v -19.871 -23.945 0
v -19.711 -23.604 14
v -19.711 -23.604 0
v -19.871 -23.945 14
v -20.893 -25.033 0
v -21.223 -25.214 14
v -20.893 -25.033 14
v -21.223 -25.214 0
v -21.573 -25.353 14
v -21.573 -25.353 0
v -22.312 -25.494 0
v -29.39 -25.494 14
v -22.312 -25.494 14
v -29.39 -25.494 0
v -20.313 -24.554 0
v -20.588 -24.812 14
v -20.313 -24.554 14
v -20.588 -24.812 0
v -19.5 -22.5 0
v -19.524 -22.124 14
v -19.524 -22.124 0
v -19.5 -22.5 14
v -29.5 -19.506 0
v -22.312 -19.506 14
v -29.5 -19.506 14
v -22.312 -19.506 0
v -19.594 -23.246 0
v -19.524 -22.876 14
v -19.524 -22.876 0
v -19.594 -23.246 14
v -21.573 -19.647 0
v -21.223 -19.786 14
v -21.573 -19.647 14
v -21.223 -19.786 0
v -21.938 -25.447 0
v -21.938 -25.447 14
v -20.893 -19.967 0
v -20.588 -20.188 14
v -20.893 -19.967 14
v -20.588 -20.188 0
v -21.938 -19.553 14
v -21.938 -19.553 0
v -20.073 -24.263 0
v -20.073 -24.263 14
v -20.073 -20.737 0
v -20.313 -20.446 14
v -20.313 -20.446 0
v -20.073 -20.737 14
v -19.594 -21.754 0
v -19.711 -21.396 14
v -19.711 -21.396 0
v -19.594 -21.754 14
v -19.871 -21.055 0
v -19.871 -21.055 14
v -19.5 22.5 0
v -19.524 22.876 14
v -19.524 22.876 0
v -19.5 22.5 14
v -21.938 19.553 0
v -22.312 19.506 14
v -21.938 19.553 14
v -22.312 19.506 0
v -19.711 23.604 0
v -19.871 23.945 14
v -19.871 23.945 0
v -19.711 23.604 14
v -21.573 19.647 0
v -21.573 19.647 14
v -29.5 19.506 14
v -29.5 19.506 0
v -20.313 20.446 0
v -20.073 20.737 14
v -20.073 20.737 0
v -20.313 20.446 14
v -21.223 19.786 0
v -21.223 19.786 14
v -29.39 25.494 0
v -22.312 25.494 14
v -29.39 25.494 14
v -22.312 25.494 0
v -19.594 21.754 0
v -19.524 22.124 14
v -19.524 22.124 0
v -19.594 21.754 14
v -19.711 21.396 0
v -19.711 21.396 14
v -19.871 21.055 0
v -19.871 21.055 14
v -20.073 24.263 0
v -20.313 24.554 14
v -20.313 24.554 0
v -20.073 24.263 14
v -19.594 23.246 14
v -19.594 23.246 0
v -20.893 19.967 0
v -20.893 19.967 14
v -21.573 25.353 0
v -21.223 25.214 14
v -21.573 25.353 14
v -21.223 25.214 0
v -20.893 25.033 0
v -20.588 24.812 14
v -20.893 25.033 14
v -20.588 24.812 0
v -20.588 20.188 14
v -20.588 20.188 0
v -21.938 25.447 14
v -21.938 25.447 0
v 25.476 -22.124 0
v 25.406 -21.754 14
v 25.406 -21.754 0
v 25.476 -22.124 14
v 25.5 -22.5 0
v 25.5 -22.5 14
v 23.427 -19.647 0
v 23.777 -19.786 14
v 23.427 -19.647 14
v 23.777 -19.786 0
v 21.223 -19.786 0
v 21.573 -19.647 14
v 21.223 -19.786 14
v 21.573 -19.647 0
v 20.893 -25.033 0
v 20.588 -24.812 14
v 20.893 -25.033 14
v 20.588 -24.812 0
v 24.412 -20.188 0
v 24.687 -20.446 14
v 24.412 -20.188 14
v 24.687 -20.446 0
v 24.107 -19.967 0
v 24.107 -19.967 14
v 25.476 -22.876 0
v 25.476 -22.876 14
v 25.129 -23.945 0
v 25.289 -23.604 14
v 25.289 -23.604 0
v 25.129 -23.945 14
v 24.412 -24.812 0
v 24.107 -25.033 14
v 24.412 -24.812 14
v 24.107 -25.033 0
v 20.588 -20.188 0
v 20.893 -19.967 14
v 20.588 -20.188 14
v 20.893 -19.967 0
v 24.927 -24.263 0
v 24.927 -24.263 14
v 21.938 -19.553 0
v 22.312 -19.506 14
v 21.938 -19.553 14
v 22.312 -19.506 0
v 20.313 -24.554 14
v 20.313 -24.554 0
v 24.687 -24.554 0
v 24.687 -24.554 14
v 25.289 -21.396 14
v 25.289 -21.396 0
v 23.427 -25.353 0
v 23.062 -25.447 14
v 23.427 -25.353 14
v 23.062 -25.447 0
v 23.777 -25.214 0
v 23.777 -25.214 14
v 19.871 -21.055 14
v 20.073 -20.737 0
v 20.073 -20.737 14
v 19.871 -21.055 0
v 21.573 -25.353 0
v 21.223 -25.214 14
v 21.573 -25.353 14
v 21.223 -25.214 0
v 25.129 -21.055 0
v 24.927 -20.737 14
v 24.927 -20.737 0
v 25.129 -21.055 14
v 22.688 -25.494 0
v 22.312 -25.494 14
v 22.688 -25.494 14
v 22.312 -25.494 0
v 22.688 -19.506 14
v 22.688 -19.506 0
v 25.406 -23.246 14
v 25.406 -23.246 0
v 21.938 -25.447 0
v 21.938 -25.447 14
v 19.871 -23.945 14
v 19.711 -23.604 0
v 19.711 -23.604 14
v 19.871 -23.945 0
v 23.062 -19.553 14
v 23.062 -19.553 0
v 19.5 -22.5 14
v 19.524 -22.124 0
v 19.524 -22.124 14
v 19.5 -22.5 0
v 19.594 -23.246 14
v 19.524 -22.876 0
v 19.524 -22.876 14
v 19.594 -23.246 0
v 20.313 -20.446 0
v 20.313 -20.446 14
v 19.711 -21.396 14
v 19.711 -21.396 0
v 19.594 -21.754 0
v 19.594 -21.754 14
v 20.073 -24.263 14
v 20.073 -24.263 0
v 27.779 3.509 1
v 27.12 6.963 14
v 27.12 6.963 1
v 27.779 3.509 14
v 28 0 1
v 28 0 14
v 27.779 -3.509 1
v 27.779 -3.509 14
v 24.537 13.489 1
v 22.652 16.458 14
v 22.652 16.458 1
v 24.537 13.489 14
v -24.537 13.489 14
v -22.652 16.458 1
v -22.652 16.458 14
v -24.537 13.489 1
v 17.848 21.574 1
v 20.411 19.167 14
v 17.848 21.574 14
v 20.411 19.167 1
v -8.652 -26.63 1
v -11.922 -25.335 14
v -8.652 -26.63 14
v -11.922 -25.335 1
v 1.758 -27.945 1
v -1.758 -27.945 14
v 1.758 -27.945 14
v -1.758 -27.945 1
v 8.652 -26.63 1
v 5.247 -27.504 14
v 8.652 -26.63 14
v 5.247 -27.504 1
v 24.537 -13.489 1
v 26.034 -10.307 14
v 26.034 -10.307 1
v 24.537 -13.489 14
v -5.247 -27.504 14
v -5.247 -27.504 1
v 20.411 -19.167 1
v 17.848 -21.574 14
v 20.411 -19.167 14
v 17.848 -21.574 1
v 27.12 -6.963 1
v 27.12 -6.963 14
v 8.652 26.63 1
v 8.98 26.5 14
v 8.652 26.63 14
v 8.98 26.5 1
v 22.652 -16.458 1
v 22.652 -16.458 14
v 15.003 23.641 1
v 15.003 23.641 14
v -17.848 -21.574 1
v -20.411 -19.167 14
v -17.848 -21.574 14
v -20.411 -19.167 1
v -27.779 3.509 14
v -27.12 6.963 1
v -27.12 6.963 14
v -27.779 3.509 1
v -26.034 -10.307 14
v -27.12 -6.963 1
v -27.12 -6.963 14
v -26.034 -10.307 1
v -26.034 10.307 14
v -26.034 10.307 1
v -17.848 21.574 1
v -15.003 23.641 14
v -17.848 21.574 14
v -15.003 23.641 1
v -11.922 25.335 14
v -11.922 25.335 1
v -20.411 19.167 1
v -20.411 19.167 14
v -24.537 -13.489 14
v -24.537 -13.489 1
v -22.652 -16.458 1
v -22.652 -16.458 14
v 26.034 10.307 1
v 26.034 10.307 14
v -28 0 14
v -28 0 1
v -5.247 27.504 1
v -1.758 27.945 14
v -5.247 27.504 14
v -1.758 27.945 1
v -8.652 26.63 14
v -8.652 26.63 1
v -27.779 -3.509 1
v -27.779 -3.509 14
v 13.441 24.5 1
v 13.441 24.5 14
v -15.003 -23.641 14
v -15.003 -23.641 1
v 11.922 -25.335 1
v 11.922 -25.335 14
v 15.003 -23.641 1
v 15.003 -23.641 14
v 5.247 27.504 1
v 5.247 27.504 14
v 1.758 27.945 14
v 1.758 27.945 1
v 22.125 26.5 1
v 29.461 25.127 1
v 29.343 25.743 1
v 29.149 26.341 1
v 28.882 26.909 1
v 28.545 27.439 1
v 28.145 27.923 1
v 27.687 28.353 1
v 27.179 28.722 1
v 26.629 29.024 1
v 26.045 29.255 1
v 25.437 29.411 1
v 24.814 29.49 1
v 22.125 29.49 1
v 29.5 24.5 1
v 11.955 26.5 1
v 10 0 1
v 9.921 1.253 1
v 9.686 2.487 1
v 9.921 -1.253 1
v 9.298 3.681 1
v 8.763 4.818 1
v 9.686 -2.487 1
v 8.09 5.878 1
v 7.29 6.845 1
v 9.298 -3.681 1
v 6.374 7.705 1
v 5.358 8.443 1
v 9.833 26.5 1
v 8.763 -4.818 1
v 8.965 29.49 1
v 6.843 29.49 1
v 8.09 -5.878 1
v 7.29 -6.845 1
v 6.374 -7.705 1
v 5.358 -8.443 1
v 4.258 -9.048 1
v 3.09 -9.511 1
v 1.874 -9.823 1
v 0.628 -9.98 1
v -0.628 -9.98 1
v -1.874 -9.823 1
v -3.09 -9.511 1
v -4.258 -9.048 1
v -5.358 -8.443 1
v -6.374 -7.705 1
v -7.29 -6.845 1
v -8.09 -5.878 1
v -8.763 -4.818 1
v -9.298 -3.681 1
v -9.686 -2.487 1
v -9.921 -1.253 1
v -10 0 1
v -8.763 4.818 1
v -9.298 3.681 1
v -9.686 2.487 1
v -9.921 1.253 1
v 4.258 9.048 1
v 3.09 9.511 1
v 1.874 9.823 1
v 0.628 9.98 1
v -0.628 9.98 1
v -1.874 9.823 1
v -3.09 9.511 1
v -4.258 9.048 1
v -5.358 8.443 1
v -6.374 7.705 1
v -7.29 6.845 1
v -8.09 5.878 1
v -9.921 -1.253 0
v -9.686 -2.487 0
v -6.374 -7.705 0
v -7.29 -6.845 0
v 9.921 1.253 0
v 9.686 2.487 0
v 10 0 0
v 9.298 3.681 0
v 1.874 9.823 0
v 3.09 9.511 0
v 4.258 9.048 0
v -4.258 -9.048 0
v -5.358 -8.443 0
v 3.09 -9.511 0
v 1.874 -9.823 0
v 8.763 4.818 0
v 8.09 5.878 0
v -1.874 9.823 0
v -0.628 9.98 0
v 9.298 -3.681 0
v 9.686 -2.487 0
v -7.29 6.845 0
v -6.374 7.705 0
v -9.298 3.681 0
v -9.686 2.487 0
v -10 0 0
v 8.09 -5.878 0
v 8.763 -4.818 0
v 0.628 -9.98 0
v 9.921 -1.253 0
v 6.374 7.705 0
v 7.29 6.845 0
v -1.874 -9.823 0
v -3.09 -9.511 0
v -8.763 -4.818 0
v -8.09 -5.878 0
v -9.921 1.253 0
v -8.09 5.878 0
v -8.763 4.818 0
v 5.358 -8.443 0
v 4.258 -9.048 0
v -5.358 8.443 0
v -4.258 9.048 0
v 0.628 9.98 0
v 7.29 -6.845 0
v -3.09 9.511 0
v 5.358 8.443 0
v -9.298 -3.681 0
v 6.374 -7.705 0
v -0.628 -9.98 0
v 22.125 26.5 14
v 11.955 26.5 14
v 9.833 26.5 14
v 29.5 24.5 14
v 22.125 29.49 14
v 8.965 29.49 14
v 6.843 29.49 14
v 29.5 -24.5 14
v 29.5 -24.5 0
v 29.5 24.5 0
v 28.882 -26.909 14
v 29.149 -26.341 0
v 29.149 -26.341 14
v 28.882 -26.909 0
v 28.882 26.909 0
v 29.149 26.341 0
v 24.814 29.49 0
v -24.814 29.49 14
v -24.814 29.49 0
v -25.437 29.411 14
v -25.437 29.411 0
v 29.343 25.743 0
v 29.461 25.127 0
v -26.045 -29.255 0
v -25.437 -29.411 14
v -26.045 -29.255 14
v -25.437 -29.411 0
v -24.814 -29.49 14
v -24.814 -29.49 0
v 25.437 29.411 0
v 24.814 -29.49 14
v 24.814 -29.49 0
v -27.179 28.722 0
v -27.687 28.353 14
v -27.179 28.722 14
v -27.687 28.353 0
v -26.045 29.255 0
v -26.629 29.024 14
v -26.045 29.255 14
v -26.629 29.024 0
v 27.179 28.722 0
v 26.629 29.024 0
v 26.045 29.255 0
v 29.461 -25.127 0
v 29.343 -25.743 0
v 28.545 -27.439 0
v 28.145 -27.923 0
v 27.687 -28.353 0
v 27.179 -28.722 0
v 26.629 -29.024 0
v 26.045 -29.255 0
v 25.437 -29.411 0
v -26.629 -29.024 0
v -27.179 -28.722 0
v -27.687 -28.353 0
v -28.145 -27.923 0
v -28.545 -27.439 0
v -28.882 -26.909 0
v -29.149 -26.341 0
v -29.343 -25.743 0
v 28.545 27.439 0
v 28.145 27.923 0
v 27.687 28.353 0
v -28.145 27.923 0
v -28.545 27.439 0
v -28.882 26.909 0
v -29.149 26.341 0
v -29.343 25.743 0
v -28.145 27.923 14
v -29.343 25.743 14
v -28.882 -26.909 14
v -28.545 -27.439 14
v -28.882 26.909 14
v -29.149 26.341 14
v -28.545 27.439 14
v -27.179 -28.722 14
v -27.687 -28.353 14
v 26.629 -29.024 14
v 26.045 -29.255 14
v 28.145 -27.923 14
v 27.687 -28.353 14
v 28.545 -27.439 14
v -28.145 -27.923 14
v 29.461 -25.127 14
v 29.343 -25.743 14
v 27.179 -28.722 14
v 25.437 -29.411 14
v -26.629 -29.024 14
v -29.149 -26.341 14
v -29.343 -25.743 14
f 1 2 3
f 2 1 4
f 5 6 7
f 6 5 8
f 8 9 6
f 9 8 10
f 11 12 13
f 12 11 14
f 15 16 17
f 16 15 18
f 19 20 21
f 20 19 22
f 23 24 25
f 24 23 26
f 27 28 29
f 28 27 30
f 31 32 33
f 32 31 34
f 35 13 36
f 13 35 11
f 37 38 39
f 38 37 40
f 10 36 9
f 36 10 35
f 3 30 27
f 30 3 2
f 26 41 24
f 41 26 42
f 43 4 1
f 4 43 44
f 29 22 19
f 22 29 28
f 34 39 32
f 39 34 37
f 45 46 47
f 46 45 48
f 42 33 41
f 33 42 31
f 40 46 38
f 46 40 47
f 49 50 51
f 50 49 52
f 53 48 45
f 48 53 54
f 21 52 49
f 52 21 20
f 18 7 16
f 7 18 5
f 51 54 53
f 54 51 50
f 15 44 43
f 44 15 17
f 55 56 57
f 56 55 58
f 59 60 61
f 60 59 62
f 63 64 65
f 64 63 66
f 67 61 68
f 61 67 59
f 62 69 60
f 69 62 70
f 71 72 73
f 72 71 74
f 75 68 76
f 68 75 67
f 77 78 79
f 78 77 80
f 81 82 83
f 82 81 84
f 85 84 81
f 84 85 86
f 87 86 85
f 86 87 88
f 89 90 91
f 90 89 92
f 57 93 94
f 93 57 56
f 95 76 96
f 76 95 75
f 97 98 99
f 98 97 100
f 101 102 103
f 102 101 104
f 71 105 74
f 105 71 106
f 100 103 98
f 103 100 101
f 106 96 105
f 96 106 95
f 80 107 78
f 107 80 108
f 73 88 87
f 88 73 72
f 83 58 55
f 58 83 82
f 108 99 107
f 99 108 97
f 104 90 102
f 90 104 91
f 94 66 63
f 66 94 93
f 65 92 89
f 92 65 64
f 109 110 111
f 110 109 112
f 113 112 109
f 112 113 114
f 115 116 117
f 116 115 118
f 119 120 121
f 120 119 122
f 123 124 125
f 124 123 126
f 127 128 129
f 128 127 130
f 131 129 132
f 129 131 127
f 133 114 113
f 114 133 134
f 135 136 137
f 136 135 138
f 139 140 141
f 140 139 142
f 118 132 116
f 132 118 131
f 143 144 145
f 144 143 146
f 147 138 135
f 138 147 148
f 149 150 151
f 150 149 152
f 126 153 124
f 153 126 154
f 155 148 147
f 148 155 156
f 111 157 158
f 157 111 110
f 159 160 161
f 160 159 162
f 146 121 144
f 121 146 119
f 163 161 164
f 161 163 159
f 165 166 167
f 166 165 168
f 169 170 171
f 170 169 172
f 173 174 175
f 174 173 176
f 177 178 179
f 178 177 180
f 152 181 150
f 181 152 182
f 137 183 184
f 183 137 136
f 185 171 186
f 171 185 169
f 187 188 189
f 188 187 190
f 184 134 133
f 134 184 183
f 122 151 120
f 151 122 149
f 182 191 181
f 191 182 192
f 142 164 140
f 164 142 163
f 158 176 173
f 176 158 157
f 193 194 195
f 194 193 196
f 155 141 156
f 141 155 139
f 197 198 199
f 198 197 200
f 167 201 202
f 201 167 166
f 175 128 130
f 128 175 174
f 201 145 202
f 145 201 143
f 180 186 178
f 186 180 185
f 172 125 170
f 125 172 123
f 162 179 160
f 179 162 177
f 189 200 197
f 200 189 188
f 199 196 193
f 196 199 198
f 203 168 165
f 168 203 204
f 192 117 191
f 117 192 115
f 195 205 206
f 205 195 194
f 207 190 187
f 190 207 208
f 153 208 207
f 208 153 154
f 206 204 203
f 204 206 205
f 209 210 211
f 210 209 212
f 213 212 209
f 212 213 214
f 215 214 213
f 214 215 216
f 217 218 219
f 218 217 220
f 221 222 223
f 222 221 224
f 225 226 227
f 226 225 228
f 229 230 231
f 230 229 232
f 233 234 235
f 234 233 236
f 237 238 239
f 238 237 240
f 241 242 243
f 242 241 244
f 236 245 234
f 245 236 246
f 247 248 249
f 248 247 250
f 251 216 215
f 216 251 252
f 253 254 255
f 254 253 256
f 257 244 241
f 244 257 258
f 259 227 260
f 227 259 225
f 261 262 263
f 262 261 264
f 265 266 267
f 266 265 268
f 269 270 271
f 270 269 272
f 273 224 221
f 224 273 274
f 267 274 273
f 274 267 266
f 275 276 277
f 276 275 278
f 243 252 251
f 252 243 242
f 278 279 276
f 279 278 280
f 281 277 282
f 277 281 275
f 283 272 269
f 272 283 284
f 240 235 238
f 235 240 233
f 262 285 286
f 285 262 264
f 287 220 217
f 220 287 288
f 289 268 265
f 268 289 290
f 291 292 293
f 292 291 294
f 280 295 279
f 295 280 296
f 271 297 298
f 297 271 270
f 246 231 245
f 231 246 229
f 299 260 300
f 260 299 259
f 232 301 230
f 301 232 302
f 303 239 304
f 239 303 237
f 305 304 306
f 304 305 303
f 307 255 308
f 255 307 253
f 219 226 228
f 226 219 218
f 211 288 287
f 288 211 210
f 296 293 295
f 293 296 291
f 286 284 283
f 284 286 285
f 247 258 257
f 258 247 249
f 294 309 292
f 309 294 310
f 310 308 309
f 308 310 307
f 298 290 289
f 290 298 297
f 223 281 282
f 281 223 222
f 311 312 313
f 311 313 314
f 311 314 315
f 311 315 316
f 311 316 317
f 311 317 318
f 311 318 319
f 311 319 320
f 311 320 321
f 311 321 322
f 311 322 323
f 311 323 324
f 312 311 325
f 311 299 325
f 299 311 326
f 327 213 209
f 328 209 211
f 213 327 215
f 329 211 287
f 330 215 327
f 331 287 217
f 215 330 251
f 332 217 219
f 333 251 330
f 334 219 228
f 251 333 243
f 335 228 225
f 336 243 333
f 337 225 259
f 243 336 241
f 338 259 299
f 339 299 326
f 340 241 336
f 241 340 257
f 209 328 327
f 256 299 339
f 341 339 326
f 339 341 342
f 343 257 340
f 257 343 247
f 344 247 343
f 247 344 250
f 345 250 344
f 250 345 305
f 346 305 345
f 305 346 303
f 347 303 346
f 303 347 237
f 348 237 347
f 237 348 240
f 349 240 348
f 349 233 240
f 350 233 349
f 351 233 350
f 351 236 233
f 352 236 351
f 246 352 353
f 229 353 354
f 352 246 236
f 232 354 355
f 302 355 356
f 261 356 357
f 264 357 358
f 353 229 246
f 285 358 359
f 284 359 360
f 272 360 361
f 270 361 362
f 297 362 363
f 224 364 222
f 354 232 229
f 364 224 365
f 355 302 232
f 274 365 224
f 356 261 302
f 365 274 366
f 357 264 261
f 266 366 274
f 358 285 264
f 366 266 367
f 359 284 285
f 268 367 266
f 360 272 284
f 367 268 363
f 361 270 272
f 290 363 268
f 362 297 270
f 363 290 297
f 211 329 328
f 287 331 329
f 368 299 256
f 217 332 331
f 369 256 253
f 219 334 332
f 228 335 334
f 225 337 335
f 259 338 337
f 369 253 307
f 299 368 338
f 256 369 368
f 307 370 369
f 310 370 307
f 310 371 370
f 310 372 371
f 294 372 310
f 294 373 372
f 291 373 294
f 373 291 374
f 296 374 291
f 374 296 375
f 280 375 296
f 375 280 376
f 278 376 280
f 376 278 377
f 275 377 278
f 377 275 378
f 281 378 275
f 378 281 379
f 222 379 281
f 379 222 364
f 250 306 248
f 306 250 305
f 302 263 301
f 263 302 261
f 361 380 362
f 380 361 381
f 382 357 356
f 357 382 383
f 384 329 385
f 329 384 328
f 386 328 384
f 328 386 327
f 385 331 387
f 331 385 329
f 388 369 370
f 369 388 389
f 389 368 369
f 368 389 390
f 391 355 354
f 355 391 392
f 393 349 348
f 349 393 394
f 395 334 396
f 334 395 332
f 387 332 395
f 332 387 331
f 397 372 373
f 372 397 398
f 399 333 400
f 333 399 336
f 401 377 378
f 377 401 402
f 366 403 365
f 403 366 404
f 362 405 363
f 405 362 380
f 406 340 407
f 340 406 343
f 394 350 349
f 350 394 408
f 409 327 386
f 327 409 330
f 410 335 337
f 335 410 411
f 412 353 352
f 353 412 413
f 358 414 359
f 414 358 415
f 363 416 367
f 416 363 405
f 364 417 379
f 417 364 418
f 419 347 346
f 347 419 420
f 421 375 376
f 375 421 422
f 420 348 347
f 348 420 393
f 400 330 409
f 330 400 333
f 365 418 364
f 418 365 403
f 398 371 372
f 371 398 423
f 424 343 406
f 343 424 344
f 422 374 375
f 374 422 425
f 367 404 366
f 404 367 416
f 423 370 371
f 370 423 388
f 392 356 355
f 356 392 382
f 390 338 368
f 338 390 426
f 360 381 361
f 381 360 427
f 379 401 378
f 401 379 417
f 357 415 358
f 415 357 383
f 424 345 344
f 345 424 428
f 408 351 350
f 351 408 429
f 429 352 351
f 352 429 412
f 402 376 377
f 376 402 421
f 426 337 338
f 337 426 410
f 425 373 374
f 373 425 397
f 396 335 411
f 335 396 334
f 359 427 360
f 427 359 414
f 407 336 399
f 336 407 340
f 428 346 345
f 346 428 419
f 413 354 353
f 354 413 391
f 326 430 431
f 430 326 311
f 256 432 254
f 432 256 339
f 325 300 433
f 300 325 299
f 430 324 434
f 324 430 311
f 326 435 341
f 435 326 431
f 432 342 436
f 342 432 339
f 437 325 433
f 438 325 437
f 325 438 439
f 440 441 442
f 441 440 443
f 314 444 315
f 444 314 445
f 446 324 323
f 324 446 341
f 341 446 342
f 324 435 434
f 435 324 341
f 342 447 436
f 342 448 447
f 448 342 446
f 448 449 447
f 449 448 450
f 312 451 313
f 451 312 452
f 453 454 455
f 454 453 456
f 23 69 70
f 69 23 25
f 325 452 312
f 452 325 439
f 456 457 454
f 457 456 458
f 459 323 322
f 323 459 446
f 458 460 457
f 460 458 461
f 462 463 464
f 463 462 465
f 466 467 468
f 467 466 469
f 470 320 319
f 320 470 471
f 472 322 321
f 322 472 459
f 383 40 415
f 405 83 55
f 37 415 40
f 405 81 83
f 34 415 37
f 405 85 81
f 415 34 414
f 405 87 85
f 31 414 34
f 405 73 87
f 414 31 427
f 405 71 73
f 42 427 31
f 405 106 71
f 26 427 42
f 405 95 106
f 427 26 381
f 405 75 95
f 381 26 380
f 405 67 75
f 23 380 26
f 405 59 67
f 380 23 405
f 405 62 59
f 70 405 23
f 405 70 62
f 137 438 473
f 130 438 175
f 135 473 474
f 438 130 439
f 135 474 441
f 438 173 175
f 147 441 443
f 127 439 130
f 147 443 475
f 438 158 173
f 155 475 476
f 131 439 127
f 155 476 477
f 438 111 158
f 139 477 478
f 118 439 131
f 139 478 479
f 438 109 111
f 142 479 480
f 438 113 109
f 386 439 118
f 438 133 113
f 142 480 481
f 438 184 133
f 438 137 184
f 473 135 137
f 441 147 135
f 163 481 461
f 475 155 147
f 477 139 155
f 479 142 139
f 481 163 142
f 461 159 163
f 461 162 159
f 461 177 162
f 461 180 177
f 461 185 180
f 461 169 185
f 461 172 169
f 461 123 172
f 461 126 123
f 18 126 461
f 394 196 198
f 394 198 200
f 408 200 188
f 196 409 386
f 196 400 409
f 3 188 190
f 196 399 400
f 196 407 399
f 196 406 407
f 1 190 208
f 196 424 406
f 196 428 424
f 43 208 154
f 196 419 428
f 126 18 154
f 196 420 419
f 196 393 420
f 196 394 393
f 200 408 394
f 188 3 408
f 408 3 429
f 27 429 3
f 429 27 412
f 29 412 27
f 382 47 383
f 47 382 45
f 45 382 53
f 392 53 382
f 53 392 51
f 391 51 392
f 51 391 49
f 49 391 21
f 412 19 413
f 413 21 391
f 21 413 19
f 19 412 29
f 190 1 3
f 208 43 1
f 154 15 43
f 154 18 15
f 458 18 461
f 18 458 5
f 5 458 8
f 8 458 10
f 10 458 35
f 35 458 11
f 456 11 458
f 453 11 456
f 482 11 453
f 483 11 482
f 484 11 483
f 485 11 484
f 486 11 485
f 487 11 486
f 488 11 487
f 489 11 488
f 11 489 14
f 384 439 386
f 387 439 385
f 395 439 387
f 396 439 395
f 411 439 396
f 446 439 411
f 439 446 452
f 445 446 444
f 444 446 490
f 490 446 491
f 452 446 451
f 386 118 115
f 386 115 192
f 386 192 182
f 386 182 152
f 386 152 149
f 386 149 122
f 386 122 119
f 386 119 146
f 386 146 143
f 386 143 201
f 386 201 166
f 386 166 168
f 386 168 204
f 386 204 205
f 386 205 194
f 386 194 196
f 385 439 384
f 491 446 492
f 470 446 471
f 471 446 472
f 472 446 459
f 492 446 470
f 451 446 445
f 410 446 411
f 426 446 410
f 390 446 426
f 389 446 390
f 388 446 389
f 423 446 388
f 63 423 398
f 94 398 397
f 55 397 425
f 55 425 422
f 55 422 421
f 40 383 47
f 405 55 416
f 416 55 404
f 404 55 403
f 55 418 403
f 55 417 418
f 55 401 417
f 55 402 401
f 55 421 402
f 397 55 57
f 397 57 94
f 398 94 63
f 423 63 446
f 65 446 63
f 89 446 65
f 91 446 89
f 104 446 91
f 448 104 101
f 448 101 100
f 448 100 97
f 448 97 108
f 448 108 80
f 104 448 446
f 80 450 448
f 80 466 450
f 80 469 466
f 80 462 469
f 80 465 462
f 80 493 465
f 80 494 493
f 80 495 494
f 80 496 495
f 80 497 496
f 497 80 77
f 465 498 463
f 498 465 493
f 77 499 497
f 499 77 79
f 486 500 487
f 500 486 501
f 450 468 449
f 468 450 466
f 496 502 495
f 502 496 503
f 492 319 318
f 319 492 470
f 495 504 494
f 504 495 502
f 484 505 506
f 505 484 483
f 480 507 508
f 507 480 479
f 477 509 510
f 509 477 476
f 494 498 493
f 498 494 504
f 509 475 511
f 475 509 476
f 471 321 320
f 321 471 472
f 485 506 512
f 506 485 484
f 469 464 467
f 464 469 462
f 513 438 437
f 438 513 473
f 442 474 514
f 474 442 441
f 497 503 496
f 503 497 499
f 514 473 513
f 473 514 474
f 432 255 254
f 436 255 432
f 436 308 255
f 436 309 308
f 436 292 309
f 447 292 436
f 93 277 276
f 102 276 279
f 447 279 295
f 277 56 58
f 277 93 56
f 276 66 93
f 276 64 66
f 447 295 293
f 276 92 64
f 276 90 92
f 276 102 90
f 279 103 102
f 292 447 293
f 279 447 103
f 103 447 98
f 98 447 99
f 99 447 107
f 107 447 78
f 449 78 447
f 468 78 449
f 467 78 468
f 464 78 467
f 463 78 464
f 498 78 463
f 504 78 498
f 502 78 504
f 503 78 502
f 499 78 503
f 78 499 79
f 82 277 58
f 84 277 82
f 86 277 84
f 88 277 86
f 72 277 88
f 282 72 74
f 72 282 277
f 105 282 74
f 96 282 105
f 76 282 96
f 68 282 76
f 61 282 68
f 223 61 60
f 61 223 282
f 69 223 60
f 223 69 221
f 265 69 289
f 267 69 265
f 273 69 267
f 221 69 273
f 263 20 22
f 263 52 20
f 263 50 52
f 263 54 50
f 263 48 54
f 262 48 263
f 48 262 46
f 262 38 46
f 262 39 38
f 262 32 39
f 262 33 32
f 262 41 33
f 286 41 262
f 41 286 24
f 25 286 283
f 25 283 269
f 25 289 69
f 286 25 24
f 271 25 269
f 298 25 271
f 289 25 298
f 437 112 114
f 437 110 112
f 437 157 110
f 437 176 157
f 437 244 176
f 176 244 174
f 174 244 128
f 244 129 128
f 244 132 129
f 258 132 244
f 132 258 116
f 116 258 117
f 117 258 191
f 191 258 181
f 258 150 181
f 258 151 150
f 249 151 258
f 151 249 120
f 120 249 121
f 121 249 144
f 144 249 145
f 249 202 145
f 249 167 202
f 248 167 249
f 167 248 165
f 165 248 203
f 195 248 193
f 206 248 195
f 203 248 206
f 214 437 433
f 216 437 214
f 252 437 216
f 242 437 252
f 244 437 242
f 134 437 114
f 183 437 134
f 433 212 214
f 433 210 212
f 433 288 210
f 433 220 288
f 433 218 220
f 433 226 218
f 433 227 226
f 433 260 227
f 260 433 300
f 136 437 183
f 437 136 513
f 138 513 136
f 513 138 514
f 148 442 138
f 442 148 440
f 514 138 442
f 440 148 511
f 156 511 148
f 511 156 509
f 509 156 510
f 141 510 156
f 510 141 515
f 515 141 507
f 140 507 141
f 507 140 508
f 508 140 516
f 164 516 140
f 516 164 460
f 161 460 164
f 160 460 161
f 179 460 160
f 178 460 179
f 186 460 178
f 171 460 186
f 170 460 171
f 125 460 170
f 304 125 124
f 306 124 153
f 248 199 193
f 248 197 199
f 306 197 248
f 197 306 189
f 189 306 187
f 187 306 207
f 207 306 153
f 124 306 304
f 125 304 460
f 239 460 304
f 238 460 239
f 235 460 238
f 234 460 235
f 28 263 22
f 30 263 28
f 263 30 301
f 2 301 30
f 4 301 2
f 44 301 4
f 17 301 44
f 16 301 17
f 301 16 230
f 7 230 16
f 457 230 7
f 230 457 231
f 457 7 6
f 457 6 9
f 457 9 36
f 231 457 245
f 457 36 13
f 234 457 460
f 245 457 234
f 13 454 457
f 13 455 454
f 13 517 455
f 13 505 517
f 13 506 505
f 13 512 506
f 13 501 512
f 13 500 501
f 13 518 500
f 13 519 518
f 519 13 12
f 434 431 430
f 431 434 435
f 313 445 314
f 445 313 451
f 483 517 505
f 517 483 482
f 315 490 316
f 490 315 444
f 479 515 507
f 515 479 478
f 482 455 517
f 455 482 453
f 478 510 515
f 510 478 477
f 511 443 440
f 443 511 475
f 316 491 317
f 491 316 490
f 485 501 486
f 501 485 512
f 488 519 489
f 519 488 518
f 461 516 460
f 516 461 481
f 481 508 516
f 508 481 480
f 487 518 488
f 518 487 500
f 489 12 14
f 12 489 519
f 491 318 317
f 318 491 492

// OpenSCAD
$fn = 50;


difference() {
	union() {
		translate(v = [0, 0, 0]) {
			rotate(a = [0, 0, 0]) {
				hull() {
					translate(v = [-24.5000000000, 24.5000000000, 0]) {
						rotate(a = [0, 0, 0]) {
							translate(v = [0, 0, 0]) {
								rotate(a = [0, 0, 0]) {
									cylinder(h = 14, r = 5);
								}
							}
						}
					}
					translate(v = [24.5000000000, 24.5000000000, 0]) {
						rotate(a = [0, 0, 0]) {
							translate(v = [0, 0, 0]) {
								rotate(a = [0, 0, 0]) {
									cylinder(h = 14, r = 5);
								}
							}
						}
					}
					translate(v = [-24.5000000000, -24.5000000000, 0]) {
						rotate(a = [0, 0, 0]) {
							translate(v = [0, 0, 0]) {
								rotate(a = [0, 0, 0]) {
									cylinder(h = 14, r = 5);
								}
							}
						}
					}
					translate(v = [24.5000000000, -24.5000000000, 0]) {
						rotate(a = [0, 0, 0]) {
							translate(v = [0, 0, 0]) {
								rotate(a = [0, 0, 0]) {
									cylinder(h = 14, r = 5);
								}
							}
						}
					}
				}
			}
		}
	}
	union() {
		translate(v = [-30.0000000000, -22.5000000000, -125]) {
			rotate(a = [0, 0, 0]) {
				hull() {
					translate(v = [7.5000000000, 0, 0]) {
						rotate(a = [0, 0, 0]) {
							translate(v = [0, 0, 0]) {
								rotate(a = [0, 0, 0]) {
									cylinder(h = 250, r = 3.0000000000);
								}
							}
						}
					}
					translate(v = [-7.5000000000, 0, 0]) {
						rotate(a = [0, 0, 0]) {
							translate(v = [0, 0, 0]) {
								rotate(a = [0, 0, 0]) {
									cylinder(h = 250, r = 3.0000000000);
								}
							}
						}
					}
				}
			}
		}
		translate(v = [-30.0000000000, 22.5000000000, -125]) {
			rotate(a = [0, 0, 0]) {
				hull() {
					translate(v = [7.5000000000, 0, 0]) {
						rotate(a = [0, 0, 0]) {
							translate(v = [0, 0, 0]) {
								rotate(a = [0, 0, 0]) {
									cylinder(h = 250, r = 3.0000000000);
								}
							}
						}
					}
					translate(v = [-7.5000000000, 0, 0]) {
						rotate(a = [0, 0, 0]) {
							translate(v = [0, 0, 0]) {
								rotate(a = [0, 0, 0]) {
									cylinder(h = 250, r = 3.0000000000);
								}
							}
						}
					}
				}
			}
		}
		translate(v = [22.5000000000, -22.5000000000, -125.0000000000]) {
			rotate(a = [0, 0, 0]) {
				cylinder(h = 250, r = 3.0000000000);
			}
		}
		translate(v = [0, 0, 1.0000000000]) {
			rotate(a = [0, 0, 0]) {
				cylinder(h = 16, r = 28.0000000000);
			}
		}
		translate(v = [0, 0, -7.0000000000]) {
			rotate(a = [0, 0, 0]) {
				cylinder(h = 14, r = 10.0000000000);
			}
		}
		translate(v = [0.0000000000, 24.5000000000, 1]) {
			rotate(a = [0, 0, 0]) {
				cube(size = [29.5000000000, 2, 16]);
			}
		}
		translate(v = [22.1250000000, 24.5000000000, 1]) {
			rotate(a = [0, 0, 0]) {
				cube(size = [7.3750000000, 5, 16]);
			}
		}
		translate(v = [6.0833333333, 30.2500000000, 1]) {
			rotate(a = [0, 0, -45]) {
				cube(size = [7.5000000000, 1.5000000000, 16]);
			}
		}
	}
}
